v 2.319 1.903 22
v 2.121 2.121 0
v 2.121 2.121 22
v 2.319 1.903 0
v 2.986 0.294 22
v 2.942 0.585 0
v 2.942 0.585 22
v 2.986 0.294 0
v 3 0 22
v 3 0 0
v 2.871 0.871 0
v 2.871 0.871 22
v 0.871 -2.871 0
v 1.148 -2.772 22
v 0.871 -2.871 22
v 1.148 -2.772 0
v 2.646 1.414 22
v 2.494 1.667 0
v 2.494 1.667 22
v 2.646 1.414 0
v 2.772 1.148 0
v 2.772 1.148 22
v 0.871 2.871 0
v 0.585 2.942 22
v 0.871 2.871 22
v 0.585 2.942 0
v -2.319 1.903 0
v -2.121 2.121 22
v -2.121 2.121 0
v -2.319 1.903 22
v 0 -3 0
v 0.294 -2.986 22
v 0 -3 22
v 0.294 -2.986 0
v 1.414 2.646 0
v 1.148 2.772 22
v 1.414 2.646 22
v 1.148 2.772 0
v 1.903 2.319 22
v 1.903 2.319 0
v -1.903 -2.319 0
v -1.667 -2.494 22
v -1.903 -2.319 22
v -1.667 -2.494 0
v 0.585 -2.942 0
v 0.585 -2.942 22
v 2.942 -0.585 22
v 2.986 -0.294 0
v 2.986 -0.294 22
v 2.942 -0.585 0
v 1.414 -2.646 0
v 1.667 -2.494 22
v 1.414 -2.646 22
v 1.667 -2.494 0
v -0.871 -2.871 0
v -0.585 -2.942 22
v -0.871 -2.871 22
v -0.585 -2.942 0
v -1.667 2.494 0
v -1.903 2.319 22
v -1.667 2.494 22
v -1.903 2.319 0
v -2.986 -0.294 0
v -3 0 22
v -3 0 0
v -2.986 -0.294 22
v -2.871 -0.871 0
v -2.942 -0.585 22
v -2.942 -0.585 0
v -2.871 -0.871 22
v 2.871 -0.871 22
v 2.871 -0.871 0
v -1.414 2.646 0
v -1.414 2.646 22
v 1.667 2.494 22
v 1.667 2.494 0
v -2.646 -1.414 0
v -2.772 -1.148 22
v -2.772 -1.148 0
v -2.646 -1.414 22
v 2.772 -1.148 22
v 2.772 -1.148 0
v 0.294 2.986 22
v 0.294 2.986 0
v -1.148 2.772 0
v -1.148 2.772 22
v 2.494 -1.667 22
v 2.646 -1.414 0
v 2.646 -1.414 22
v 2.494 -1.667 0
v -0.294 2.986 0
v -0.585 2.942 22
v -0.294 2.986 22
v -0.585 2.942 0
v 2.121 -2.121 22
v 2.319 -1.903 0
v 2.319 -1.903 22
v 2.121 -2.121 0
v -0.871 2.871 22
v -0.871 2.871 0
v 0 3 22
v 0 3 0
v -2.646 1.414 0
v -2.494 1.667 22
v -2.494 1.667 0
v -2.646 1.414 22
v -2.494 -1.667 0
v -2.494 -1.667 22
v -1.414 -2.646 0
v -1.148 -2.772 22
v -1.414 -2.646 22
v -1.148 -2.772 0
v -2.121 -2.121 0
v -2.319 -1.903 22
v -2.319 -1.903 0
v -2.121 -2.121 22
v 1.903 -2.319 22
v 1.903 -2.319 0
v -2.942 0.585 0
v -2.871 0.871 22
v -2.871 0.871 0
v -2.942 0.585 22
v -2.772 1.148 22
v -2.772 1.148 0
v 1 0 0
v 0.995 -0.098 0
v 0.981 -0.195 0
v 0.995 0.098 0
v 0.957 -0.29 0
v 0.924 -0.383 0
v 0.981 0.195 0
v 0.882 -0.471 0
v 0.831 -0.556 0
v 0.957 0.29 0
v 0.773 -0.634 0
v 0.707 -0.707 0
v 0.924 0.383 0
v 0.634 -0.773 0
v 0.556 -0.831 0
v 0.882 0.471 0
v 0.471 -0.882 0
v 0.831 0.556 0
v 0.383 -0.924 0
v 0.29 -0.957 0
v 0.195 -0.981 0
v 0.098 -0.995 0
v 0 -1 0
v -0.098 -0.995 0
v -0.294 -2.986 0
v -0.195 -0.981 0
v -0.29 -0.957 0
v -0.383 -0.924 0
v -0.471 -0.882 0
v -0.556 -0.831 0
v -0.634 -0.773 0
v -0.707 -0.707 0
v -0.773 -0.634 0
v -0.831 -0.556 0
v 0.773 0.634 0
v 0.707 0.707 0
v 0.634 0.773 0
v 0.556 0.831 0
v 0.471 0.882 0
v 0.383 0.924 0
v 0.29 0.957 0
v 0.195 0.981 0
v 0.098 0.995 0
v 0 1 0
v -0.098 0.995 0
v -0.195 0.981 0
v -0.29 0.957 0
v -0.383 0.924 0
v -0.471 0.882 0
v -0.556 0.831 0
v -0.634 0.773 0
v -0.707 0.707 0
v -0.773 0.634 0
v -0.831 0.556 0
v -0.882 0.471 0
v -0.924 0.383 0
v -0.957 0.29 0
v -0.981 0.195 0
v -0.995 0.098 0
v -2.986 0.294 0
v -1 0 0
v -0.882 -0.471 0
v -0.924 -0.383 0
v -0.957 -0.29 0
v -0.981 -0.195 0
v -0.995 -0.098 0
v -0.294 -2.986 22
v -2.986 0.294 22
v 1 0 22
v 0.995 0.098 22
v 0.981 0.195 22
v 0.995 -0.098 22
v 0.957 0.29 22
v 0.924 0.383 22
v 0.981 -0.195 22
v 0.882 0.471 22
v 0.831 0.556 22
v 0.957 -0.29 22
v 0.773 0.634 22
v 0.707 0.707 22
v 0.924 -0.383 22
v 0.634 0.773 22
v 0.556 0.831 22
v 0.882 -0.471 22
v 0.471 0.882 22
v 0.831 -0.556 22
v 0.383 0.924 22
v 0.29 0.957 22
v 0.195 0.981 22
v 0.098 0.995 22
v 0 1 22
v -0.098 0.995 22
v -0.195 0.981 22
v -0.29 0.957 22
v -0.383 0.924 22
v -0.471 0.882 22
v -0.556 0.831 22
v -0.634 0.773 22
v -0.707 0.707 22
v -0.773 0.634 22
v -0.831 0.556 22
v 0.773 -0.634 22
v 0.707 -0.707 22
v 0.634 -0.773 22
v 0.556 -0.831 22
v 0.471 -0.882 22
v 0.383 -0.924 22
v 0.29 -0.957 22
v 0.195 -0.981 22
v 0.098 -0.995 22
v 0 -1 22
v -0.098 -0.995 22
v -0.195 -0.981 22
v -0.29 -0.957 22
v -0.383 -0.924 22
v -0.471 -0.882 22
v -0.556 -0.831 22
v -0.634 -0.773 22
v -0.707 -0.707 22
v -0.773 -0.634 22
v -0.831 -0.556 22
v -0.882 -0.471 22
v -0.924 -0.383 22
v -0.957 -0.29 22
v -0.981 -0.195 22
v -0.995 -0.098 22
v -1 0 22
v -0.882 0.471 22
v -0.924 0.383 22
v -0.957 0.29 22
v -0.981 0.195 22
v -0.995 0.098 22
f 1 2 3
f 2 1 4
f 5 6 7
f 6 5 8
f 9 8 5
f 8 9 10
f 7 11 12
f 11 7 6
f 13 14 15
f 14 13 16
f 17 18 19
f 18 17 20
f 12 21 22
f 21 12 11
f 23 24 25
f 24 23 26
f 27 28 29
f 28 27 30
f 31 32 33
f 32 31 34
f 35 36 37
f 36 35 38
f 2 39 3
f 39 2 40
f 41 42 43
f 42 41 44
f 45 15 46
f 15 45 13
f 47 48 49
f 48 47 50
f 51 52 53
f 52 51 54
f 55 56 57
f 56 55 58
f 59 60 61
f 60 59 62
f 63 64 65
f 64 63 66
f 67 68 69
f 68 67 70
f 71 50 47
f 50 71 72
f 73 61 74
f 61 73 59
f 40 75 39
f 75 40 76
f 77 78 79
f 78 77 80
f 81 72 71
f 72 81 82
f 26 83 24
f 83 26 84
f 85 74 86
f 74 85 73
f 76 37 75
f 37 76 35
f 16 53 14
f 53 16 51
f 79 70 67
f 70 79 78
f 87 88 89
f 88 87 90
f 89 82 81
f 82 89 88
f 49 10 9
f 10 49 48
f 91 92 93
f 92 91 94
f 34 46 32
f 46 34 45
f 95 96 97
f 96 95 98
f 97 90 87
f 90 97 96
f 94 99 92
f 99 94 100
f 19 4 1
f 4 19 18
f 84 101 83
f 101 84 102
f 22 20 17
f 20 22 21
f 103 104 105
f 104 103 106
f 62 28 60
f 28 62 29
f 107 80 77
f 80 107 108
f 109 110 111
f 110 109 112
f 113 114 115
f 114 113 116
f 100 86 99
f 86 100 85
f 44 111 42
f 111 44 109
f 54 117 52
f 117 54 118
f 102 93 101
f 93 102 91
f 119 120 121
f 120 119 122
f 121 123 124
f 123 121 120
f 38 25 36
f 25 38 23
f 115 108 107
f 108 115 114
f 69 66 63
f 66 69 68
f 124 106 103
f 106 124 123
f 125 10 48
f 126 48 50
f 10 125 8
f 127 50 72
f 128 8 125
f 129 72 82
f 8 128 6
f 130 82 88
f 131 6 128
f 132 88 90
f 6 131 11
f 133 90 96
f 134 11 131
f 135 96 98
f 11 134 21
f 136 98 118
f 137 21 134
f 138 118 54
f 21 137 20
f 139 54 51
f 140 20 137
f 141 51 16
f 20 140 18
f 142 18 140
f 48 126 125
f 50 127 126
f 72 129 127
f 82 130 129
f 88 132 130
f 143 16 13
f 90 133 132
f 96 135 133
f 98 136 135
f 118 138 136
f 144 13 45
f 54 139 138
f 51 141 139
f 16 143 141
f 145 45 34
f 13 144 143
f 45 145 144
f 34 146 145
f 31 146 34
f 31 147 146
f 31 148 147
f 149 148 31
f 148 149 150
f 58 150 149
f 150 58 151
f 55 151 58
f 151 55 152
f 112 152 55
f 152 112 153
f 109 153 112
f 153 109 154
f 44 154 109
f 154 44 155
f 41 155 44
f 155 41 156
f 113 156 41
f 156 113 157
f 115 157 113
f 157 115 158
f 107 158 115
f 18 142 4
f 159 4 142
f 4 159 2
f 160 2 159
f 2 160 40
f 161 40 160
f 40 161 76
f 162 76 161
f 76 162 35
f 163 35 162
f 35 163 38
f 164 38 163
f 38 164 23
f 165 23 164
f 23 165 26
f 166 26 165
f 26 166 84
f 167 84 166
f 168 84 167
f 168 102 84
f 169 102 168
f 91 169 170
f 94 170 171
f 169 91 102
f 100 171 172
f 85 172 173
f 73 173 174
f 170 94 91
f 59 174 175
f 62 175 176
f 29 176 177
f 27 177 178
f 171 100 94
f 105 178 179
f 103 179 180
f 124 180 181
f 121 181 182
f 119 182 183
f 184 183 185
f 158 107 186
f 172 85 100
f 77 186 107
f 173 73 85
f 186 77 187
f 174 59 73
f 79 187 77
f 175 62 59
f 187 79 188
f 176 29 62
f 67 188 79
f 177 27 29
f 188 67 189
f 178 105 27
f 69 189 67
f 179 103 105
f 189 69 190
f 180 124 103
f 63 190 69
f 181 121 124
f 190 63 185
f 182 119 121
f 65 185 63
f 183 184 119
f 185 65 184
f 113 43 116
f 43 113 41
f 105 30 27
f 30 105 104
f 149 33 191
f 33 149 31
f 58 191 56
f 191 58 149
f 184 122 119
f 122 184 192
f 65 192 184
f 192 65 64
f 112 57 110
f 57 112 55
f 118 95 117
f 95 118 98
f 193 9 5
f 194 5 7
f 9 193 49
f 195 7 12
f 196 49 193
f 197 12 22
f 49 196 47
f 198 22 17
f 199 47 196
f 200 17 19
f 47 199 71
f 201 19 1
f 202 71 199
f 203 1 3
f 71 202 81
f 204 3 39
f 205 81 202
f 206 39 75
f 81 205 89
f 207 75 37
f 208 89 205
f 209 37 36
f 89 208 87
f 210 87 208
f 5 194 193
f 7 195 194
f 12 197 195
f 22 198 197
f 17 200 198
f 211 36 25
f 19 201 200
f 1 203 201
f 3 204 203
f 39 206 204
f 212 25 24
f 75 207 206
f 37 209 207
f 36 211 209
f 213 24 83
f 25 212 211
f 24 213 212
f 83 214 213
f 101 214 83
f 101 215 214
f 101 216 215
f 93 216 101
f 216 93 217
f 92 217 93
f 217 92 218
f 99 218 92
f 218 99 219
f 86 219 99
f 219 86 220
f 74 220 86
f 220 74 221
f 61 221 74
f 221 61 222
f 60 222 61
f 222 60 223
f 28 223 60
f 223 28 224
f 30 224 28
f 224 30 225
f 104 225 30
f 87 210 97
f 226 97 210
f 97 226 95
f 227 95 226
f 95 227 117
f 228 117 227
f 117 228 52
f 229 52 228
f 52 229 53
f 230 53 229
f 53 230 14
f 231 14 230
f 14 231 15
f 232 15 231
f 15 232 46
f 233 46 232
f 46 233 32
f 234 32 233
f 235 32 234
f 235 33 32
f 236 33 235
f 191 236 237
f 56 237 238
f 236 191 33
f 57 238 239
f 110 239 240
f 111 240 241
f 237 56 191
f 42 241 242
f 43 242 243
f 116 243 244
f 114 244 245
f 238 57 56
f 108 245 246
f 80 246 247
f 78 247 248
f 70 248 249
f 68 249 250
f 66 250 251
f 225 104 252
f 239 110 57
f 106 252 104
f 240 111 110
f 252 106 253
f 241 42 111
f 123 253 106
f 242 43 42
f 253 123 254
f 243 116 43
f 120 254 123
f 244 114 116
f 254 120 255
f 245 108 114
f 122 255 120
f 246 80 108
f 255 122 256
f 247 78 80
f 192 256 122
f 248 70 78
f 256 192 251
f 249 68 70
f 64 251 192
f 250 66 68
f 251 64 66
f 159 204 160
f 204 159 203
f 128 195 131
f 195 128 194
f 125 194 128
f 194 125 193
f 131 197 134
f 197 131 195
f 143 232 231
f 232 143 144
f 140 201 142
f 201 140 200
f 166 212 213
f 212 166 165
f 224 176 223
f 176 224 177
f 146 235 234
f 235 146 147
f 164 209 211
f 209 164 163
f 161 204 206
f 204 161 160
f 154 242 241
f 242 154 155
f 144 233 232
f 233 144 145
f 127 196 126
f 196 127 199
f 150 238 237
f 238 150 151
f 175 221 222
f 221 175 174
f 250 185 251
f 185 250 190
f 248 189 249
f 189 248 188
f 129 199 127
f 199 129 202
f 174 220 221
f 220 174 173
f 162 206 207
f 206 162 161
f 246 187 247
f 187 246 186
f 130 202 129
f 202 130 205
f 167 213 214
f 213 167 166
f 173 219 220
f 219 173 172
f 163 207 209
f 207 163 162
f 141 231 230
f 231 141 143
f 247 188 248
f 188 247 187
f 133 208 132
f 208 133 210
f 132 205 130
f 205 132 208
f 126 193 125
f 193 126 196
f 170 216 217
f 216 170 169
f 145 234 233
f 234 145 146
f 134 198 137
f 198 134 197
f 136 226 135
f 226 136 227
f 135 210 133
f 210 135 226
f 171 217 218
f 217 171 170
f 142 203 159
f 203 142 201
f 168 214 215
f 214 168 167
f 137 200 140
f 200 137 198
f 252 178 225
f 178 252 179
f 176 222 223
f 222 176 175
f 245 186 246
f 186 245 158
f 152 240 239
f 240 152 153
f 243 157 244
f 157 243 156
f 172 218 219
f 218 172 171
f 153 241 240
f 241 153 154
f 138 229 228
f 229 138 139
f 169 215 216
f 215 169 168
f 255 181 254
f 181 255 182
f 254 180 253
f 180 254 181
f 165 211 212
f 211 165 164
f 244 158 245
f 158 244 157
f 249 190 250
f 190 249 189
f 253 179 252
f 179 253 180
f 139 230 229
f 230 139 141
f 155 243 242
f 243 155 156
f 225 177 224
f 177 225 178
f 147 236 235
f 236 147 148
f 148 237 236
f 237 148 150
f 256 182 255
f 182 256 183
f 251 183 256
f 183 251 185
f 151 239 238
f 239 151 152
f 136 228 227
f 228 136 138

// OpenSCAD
//
// standoff-6x22(2.0)-3-20260303A.scad
//
// Cylinder with through hole
//

D_outer = 6.0; // 外径 (mm)
L       = 22;  // 長さ (mm)
D_hole  = 2.0; // 穴径 (mm)

$fn = 64;      // 円の滑らかさ

difference() {
    // 外側の円柱
    cylinder(d = D_outer, h = L);

    // 中心に貫通穴
    // 少し長めにして確実に貫通させる
    translate([0, 0, -1])
        cylinder(d = D_hole, h = L + 2);
}
